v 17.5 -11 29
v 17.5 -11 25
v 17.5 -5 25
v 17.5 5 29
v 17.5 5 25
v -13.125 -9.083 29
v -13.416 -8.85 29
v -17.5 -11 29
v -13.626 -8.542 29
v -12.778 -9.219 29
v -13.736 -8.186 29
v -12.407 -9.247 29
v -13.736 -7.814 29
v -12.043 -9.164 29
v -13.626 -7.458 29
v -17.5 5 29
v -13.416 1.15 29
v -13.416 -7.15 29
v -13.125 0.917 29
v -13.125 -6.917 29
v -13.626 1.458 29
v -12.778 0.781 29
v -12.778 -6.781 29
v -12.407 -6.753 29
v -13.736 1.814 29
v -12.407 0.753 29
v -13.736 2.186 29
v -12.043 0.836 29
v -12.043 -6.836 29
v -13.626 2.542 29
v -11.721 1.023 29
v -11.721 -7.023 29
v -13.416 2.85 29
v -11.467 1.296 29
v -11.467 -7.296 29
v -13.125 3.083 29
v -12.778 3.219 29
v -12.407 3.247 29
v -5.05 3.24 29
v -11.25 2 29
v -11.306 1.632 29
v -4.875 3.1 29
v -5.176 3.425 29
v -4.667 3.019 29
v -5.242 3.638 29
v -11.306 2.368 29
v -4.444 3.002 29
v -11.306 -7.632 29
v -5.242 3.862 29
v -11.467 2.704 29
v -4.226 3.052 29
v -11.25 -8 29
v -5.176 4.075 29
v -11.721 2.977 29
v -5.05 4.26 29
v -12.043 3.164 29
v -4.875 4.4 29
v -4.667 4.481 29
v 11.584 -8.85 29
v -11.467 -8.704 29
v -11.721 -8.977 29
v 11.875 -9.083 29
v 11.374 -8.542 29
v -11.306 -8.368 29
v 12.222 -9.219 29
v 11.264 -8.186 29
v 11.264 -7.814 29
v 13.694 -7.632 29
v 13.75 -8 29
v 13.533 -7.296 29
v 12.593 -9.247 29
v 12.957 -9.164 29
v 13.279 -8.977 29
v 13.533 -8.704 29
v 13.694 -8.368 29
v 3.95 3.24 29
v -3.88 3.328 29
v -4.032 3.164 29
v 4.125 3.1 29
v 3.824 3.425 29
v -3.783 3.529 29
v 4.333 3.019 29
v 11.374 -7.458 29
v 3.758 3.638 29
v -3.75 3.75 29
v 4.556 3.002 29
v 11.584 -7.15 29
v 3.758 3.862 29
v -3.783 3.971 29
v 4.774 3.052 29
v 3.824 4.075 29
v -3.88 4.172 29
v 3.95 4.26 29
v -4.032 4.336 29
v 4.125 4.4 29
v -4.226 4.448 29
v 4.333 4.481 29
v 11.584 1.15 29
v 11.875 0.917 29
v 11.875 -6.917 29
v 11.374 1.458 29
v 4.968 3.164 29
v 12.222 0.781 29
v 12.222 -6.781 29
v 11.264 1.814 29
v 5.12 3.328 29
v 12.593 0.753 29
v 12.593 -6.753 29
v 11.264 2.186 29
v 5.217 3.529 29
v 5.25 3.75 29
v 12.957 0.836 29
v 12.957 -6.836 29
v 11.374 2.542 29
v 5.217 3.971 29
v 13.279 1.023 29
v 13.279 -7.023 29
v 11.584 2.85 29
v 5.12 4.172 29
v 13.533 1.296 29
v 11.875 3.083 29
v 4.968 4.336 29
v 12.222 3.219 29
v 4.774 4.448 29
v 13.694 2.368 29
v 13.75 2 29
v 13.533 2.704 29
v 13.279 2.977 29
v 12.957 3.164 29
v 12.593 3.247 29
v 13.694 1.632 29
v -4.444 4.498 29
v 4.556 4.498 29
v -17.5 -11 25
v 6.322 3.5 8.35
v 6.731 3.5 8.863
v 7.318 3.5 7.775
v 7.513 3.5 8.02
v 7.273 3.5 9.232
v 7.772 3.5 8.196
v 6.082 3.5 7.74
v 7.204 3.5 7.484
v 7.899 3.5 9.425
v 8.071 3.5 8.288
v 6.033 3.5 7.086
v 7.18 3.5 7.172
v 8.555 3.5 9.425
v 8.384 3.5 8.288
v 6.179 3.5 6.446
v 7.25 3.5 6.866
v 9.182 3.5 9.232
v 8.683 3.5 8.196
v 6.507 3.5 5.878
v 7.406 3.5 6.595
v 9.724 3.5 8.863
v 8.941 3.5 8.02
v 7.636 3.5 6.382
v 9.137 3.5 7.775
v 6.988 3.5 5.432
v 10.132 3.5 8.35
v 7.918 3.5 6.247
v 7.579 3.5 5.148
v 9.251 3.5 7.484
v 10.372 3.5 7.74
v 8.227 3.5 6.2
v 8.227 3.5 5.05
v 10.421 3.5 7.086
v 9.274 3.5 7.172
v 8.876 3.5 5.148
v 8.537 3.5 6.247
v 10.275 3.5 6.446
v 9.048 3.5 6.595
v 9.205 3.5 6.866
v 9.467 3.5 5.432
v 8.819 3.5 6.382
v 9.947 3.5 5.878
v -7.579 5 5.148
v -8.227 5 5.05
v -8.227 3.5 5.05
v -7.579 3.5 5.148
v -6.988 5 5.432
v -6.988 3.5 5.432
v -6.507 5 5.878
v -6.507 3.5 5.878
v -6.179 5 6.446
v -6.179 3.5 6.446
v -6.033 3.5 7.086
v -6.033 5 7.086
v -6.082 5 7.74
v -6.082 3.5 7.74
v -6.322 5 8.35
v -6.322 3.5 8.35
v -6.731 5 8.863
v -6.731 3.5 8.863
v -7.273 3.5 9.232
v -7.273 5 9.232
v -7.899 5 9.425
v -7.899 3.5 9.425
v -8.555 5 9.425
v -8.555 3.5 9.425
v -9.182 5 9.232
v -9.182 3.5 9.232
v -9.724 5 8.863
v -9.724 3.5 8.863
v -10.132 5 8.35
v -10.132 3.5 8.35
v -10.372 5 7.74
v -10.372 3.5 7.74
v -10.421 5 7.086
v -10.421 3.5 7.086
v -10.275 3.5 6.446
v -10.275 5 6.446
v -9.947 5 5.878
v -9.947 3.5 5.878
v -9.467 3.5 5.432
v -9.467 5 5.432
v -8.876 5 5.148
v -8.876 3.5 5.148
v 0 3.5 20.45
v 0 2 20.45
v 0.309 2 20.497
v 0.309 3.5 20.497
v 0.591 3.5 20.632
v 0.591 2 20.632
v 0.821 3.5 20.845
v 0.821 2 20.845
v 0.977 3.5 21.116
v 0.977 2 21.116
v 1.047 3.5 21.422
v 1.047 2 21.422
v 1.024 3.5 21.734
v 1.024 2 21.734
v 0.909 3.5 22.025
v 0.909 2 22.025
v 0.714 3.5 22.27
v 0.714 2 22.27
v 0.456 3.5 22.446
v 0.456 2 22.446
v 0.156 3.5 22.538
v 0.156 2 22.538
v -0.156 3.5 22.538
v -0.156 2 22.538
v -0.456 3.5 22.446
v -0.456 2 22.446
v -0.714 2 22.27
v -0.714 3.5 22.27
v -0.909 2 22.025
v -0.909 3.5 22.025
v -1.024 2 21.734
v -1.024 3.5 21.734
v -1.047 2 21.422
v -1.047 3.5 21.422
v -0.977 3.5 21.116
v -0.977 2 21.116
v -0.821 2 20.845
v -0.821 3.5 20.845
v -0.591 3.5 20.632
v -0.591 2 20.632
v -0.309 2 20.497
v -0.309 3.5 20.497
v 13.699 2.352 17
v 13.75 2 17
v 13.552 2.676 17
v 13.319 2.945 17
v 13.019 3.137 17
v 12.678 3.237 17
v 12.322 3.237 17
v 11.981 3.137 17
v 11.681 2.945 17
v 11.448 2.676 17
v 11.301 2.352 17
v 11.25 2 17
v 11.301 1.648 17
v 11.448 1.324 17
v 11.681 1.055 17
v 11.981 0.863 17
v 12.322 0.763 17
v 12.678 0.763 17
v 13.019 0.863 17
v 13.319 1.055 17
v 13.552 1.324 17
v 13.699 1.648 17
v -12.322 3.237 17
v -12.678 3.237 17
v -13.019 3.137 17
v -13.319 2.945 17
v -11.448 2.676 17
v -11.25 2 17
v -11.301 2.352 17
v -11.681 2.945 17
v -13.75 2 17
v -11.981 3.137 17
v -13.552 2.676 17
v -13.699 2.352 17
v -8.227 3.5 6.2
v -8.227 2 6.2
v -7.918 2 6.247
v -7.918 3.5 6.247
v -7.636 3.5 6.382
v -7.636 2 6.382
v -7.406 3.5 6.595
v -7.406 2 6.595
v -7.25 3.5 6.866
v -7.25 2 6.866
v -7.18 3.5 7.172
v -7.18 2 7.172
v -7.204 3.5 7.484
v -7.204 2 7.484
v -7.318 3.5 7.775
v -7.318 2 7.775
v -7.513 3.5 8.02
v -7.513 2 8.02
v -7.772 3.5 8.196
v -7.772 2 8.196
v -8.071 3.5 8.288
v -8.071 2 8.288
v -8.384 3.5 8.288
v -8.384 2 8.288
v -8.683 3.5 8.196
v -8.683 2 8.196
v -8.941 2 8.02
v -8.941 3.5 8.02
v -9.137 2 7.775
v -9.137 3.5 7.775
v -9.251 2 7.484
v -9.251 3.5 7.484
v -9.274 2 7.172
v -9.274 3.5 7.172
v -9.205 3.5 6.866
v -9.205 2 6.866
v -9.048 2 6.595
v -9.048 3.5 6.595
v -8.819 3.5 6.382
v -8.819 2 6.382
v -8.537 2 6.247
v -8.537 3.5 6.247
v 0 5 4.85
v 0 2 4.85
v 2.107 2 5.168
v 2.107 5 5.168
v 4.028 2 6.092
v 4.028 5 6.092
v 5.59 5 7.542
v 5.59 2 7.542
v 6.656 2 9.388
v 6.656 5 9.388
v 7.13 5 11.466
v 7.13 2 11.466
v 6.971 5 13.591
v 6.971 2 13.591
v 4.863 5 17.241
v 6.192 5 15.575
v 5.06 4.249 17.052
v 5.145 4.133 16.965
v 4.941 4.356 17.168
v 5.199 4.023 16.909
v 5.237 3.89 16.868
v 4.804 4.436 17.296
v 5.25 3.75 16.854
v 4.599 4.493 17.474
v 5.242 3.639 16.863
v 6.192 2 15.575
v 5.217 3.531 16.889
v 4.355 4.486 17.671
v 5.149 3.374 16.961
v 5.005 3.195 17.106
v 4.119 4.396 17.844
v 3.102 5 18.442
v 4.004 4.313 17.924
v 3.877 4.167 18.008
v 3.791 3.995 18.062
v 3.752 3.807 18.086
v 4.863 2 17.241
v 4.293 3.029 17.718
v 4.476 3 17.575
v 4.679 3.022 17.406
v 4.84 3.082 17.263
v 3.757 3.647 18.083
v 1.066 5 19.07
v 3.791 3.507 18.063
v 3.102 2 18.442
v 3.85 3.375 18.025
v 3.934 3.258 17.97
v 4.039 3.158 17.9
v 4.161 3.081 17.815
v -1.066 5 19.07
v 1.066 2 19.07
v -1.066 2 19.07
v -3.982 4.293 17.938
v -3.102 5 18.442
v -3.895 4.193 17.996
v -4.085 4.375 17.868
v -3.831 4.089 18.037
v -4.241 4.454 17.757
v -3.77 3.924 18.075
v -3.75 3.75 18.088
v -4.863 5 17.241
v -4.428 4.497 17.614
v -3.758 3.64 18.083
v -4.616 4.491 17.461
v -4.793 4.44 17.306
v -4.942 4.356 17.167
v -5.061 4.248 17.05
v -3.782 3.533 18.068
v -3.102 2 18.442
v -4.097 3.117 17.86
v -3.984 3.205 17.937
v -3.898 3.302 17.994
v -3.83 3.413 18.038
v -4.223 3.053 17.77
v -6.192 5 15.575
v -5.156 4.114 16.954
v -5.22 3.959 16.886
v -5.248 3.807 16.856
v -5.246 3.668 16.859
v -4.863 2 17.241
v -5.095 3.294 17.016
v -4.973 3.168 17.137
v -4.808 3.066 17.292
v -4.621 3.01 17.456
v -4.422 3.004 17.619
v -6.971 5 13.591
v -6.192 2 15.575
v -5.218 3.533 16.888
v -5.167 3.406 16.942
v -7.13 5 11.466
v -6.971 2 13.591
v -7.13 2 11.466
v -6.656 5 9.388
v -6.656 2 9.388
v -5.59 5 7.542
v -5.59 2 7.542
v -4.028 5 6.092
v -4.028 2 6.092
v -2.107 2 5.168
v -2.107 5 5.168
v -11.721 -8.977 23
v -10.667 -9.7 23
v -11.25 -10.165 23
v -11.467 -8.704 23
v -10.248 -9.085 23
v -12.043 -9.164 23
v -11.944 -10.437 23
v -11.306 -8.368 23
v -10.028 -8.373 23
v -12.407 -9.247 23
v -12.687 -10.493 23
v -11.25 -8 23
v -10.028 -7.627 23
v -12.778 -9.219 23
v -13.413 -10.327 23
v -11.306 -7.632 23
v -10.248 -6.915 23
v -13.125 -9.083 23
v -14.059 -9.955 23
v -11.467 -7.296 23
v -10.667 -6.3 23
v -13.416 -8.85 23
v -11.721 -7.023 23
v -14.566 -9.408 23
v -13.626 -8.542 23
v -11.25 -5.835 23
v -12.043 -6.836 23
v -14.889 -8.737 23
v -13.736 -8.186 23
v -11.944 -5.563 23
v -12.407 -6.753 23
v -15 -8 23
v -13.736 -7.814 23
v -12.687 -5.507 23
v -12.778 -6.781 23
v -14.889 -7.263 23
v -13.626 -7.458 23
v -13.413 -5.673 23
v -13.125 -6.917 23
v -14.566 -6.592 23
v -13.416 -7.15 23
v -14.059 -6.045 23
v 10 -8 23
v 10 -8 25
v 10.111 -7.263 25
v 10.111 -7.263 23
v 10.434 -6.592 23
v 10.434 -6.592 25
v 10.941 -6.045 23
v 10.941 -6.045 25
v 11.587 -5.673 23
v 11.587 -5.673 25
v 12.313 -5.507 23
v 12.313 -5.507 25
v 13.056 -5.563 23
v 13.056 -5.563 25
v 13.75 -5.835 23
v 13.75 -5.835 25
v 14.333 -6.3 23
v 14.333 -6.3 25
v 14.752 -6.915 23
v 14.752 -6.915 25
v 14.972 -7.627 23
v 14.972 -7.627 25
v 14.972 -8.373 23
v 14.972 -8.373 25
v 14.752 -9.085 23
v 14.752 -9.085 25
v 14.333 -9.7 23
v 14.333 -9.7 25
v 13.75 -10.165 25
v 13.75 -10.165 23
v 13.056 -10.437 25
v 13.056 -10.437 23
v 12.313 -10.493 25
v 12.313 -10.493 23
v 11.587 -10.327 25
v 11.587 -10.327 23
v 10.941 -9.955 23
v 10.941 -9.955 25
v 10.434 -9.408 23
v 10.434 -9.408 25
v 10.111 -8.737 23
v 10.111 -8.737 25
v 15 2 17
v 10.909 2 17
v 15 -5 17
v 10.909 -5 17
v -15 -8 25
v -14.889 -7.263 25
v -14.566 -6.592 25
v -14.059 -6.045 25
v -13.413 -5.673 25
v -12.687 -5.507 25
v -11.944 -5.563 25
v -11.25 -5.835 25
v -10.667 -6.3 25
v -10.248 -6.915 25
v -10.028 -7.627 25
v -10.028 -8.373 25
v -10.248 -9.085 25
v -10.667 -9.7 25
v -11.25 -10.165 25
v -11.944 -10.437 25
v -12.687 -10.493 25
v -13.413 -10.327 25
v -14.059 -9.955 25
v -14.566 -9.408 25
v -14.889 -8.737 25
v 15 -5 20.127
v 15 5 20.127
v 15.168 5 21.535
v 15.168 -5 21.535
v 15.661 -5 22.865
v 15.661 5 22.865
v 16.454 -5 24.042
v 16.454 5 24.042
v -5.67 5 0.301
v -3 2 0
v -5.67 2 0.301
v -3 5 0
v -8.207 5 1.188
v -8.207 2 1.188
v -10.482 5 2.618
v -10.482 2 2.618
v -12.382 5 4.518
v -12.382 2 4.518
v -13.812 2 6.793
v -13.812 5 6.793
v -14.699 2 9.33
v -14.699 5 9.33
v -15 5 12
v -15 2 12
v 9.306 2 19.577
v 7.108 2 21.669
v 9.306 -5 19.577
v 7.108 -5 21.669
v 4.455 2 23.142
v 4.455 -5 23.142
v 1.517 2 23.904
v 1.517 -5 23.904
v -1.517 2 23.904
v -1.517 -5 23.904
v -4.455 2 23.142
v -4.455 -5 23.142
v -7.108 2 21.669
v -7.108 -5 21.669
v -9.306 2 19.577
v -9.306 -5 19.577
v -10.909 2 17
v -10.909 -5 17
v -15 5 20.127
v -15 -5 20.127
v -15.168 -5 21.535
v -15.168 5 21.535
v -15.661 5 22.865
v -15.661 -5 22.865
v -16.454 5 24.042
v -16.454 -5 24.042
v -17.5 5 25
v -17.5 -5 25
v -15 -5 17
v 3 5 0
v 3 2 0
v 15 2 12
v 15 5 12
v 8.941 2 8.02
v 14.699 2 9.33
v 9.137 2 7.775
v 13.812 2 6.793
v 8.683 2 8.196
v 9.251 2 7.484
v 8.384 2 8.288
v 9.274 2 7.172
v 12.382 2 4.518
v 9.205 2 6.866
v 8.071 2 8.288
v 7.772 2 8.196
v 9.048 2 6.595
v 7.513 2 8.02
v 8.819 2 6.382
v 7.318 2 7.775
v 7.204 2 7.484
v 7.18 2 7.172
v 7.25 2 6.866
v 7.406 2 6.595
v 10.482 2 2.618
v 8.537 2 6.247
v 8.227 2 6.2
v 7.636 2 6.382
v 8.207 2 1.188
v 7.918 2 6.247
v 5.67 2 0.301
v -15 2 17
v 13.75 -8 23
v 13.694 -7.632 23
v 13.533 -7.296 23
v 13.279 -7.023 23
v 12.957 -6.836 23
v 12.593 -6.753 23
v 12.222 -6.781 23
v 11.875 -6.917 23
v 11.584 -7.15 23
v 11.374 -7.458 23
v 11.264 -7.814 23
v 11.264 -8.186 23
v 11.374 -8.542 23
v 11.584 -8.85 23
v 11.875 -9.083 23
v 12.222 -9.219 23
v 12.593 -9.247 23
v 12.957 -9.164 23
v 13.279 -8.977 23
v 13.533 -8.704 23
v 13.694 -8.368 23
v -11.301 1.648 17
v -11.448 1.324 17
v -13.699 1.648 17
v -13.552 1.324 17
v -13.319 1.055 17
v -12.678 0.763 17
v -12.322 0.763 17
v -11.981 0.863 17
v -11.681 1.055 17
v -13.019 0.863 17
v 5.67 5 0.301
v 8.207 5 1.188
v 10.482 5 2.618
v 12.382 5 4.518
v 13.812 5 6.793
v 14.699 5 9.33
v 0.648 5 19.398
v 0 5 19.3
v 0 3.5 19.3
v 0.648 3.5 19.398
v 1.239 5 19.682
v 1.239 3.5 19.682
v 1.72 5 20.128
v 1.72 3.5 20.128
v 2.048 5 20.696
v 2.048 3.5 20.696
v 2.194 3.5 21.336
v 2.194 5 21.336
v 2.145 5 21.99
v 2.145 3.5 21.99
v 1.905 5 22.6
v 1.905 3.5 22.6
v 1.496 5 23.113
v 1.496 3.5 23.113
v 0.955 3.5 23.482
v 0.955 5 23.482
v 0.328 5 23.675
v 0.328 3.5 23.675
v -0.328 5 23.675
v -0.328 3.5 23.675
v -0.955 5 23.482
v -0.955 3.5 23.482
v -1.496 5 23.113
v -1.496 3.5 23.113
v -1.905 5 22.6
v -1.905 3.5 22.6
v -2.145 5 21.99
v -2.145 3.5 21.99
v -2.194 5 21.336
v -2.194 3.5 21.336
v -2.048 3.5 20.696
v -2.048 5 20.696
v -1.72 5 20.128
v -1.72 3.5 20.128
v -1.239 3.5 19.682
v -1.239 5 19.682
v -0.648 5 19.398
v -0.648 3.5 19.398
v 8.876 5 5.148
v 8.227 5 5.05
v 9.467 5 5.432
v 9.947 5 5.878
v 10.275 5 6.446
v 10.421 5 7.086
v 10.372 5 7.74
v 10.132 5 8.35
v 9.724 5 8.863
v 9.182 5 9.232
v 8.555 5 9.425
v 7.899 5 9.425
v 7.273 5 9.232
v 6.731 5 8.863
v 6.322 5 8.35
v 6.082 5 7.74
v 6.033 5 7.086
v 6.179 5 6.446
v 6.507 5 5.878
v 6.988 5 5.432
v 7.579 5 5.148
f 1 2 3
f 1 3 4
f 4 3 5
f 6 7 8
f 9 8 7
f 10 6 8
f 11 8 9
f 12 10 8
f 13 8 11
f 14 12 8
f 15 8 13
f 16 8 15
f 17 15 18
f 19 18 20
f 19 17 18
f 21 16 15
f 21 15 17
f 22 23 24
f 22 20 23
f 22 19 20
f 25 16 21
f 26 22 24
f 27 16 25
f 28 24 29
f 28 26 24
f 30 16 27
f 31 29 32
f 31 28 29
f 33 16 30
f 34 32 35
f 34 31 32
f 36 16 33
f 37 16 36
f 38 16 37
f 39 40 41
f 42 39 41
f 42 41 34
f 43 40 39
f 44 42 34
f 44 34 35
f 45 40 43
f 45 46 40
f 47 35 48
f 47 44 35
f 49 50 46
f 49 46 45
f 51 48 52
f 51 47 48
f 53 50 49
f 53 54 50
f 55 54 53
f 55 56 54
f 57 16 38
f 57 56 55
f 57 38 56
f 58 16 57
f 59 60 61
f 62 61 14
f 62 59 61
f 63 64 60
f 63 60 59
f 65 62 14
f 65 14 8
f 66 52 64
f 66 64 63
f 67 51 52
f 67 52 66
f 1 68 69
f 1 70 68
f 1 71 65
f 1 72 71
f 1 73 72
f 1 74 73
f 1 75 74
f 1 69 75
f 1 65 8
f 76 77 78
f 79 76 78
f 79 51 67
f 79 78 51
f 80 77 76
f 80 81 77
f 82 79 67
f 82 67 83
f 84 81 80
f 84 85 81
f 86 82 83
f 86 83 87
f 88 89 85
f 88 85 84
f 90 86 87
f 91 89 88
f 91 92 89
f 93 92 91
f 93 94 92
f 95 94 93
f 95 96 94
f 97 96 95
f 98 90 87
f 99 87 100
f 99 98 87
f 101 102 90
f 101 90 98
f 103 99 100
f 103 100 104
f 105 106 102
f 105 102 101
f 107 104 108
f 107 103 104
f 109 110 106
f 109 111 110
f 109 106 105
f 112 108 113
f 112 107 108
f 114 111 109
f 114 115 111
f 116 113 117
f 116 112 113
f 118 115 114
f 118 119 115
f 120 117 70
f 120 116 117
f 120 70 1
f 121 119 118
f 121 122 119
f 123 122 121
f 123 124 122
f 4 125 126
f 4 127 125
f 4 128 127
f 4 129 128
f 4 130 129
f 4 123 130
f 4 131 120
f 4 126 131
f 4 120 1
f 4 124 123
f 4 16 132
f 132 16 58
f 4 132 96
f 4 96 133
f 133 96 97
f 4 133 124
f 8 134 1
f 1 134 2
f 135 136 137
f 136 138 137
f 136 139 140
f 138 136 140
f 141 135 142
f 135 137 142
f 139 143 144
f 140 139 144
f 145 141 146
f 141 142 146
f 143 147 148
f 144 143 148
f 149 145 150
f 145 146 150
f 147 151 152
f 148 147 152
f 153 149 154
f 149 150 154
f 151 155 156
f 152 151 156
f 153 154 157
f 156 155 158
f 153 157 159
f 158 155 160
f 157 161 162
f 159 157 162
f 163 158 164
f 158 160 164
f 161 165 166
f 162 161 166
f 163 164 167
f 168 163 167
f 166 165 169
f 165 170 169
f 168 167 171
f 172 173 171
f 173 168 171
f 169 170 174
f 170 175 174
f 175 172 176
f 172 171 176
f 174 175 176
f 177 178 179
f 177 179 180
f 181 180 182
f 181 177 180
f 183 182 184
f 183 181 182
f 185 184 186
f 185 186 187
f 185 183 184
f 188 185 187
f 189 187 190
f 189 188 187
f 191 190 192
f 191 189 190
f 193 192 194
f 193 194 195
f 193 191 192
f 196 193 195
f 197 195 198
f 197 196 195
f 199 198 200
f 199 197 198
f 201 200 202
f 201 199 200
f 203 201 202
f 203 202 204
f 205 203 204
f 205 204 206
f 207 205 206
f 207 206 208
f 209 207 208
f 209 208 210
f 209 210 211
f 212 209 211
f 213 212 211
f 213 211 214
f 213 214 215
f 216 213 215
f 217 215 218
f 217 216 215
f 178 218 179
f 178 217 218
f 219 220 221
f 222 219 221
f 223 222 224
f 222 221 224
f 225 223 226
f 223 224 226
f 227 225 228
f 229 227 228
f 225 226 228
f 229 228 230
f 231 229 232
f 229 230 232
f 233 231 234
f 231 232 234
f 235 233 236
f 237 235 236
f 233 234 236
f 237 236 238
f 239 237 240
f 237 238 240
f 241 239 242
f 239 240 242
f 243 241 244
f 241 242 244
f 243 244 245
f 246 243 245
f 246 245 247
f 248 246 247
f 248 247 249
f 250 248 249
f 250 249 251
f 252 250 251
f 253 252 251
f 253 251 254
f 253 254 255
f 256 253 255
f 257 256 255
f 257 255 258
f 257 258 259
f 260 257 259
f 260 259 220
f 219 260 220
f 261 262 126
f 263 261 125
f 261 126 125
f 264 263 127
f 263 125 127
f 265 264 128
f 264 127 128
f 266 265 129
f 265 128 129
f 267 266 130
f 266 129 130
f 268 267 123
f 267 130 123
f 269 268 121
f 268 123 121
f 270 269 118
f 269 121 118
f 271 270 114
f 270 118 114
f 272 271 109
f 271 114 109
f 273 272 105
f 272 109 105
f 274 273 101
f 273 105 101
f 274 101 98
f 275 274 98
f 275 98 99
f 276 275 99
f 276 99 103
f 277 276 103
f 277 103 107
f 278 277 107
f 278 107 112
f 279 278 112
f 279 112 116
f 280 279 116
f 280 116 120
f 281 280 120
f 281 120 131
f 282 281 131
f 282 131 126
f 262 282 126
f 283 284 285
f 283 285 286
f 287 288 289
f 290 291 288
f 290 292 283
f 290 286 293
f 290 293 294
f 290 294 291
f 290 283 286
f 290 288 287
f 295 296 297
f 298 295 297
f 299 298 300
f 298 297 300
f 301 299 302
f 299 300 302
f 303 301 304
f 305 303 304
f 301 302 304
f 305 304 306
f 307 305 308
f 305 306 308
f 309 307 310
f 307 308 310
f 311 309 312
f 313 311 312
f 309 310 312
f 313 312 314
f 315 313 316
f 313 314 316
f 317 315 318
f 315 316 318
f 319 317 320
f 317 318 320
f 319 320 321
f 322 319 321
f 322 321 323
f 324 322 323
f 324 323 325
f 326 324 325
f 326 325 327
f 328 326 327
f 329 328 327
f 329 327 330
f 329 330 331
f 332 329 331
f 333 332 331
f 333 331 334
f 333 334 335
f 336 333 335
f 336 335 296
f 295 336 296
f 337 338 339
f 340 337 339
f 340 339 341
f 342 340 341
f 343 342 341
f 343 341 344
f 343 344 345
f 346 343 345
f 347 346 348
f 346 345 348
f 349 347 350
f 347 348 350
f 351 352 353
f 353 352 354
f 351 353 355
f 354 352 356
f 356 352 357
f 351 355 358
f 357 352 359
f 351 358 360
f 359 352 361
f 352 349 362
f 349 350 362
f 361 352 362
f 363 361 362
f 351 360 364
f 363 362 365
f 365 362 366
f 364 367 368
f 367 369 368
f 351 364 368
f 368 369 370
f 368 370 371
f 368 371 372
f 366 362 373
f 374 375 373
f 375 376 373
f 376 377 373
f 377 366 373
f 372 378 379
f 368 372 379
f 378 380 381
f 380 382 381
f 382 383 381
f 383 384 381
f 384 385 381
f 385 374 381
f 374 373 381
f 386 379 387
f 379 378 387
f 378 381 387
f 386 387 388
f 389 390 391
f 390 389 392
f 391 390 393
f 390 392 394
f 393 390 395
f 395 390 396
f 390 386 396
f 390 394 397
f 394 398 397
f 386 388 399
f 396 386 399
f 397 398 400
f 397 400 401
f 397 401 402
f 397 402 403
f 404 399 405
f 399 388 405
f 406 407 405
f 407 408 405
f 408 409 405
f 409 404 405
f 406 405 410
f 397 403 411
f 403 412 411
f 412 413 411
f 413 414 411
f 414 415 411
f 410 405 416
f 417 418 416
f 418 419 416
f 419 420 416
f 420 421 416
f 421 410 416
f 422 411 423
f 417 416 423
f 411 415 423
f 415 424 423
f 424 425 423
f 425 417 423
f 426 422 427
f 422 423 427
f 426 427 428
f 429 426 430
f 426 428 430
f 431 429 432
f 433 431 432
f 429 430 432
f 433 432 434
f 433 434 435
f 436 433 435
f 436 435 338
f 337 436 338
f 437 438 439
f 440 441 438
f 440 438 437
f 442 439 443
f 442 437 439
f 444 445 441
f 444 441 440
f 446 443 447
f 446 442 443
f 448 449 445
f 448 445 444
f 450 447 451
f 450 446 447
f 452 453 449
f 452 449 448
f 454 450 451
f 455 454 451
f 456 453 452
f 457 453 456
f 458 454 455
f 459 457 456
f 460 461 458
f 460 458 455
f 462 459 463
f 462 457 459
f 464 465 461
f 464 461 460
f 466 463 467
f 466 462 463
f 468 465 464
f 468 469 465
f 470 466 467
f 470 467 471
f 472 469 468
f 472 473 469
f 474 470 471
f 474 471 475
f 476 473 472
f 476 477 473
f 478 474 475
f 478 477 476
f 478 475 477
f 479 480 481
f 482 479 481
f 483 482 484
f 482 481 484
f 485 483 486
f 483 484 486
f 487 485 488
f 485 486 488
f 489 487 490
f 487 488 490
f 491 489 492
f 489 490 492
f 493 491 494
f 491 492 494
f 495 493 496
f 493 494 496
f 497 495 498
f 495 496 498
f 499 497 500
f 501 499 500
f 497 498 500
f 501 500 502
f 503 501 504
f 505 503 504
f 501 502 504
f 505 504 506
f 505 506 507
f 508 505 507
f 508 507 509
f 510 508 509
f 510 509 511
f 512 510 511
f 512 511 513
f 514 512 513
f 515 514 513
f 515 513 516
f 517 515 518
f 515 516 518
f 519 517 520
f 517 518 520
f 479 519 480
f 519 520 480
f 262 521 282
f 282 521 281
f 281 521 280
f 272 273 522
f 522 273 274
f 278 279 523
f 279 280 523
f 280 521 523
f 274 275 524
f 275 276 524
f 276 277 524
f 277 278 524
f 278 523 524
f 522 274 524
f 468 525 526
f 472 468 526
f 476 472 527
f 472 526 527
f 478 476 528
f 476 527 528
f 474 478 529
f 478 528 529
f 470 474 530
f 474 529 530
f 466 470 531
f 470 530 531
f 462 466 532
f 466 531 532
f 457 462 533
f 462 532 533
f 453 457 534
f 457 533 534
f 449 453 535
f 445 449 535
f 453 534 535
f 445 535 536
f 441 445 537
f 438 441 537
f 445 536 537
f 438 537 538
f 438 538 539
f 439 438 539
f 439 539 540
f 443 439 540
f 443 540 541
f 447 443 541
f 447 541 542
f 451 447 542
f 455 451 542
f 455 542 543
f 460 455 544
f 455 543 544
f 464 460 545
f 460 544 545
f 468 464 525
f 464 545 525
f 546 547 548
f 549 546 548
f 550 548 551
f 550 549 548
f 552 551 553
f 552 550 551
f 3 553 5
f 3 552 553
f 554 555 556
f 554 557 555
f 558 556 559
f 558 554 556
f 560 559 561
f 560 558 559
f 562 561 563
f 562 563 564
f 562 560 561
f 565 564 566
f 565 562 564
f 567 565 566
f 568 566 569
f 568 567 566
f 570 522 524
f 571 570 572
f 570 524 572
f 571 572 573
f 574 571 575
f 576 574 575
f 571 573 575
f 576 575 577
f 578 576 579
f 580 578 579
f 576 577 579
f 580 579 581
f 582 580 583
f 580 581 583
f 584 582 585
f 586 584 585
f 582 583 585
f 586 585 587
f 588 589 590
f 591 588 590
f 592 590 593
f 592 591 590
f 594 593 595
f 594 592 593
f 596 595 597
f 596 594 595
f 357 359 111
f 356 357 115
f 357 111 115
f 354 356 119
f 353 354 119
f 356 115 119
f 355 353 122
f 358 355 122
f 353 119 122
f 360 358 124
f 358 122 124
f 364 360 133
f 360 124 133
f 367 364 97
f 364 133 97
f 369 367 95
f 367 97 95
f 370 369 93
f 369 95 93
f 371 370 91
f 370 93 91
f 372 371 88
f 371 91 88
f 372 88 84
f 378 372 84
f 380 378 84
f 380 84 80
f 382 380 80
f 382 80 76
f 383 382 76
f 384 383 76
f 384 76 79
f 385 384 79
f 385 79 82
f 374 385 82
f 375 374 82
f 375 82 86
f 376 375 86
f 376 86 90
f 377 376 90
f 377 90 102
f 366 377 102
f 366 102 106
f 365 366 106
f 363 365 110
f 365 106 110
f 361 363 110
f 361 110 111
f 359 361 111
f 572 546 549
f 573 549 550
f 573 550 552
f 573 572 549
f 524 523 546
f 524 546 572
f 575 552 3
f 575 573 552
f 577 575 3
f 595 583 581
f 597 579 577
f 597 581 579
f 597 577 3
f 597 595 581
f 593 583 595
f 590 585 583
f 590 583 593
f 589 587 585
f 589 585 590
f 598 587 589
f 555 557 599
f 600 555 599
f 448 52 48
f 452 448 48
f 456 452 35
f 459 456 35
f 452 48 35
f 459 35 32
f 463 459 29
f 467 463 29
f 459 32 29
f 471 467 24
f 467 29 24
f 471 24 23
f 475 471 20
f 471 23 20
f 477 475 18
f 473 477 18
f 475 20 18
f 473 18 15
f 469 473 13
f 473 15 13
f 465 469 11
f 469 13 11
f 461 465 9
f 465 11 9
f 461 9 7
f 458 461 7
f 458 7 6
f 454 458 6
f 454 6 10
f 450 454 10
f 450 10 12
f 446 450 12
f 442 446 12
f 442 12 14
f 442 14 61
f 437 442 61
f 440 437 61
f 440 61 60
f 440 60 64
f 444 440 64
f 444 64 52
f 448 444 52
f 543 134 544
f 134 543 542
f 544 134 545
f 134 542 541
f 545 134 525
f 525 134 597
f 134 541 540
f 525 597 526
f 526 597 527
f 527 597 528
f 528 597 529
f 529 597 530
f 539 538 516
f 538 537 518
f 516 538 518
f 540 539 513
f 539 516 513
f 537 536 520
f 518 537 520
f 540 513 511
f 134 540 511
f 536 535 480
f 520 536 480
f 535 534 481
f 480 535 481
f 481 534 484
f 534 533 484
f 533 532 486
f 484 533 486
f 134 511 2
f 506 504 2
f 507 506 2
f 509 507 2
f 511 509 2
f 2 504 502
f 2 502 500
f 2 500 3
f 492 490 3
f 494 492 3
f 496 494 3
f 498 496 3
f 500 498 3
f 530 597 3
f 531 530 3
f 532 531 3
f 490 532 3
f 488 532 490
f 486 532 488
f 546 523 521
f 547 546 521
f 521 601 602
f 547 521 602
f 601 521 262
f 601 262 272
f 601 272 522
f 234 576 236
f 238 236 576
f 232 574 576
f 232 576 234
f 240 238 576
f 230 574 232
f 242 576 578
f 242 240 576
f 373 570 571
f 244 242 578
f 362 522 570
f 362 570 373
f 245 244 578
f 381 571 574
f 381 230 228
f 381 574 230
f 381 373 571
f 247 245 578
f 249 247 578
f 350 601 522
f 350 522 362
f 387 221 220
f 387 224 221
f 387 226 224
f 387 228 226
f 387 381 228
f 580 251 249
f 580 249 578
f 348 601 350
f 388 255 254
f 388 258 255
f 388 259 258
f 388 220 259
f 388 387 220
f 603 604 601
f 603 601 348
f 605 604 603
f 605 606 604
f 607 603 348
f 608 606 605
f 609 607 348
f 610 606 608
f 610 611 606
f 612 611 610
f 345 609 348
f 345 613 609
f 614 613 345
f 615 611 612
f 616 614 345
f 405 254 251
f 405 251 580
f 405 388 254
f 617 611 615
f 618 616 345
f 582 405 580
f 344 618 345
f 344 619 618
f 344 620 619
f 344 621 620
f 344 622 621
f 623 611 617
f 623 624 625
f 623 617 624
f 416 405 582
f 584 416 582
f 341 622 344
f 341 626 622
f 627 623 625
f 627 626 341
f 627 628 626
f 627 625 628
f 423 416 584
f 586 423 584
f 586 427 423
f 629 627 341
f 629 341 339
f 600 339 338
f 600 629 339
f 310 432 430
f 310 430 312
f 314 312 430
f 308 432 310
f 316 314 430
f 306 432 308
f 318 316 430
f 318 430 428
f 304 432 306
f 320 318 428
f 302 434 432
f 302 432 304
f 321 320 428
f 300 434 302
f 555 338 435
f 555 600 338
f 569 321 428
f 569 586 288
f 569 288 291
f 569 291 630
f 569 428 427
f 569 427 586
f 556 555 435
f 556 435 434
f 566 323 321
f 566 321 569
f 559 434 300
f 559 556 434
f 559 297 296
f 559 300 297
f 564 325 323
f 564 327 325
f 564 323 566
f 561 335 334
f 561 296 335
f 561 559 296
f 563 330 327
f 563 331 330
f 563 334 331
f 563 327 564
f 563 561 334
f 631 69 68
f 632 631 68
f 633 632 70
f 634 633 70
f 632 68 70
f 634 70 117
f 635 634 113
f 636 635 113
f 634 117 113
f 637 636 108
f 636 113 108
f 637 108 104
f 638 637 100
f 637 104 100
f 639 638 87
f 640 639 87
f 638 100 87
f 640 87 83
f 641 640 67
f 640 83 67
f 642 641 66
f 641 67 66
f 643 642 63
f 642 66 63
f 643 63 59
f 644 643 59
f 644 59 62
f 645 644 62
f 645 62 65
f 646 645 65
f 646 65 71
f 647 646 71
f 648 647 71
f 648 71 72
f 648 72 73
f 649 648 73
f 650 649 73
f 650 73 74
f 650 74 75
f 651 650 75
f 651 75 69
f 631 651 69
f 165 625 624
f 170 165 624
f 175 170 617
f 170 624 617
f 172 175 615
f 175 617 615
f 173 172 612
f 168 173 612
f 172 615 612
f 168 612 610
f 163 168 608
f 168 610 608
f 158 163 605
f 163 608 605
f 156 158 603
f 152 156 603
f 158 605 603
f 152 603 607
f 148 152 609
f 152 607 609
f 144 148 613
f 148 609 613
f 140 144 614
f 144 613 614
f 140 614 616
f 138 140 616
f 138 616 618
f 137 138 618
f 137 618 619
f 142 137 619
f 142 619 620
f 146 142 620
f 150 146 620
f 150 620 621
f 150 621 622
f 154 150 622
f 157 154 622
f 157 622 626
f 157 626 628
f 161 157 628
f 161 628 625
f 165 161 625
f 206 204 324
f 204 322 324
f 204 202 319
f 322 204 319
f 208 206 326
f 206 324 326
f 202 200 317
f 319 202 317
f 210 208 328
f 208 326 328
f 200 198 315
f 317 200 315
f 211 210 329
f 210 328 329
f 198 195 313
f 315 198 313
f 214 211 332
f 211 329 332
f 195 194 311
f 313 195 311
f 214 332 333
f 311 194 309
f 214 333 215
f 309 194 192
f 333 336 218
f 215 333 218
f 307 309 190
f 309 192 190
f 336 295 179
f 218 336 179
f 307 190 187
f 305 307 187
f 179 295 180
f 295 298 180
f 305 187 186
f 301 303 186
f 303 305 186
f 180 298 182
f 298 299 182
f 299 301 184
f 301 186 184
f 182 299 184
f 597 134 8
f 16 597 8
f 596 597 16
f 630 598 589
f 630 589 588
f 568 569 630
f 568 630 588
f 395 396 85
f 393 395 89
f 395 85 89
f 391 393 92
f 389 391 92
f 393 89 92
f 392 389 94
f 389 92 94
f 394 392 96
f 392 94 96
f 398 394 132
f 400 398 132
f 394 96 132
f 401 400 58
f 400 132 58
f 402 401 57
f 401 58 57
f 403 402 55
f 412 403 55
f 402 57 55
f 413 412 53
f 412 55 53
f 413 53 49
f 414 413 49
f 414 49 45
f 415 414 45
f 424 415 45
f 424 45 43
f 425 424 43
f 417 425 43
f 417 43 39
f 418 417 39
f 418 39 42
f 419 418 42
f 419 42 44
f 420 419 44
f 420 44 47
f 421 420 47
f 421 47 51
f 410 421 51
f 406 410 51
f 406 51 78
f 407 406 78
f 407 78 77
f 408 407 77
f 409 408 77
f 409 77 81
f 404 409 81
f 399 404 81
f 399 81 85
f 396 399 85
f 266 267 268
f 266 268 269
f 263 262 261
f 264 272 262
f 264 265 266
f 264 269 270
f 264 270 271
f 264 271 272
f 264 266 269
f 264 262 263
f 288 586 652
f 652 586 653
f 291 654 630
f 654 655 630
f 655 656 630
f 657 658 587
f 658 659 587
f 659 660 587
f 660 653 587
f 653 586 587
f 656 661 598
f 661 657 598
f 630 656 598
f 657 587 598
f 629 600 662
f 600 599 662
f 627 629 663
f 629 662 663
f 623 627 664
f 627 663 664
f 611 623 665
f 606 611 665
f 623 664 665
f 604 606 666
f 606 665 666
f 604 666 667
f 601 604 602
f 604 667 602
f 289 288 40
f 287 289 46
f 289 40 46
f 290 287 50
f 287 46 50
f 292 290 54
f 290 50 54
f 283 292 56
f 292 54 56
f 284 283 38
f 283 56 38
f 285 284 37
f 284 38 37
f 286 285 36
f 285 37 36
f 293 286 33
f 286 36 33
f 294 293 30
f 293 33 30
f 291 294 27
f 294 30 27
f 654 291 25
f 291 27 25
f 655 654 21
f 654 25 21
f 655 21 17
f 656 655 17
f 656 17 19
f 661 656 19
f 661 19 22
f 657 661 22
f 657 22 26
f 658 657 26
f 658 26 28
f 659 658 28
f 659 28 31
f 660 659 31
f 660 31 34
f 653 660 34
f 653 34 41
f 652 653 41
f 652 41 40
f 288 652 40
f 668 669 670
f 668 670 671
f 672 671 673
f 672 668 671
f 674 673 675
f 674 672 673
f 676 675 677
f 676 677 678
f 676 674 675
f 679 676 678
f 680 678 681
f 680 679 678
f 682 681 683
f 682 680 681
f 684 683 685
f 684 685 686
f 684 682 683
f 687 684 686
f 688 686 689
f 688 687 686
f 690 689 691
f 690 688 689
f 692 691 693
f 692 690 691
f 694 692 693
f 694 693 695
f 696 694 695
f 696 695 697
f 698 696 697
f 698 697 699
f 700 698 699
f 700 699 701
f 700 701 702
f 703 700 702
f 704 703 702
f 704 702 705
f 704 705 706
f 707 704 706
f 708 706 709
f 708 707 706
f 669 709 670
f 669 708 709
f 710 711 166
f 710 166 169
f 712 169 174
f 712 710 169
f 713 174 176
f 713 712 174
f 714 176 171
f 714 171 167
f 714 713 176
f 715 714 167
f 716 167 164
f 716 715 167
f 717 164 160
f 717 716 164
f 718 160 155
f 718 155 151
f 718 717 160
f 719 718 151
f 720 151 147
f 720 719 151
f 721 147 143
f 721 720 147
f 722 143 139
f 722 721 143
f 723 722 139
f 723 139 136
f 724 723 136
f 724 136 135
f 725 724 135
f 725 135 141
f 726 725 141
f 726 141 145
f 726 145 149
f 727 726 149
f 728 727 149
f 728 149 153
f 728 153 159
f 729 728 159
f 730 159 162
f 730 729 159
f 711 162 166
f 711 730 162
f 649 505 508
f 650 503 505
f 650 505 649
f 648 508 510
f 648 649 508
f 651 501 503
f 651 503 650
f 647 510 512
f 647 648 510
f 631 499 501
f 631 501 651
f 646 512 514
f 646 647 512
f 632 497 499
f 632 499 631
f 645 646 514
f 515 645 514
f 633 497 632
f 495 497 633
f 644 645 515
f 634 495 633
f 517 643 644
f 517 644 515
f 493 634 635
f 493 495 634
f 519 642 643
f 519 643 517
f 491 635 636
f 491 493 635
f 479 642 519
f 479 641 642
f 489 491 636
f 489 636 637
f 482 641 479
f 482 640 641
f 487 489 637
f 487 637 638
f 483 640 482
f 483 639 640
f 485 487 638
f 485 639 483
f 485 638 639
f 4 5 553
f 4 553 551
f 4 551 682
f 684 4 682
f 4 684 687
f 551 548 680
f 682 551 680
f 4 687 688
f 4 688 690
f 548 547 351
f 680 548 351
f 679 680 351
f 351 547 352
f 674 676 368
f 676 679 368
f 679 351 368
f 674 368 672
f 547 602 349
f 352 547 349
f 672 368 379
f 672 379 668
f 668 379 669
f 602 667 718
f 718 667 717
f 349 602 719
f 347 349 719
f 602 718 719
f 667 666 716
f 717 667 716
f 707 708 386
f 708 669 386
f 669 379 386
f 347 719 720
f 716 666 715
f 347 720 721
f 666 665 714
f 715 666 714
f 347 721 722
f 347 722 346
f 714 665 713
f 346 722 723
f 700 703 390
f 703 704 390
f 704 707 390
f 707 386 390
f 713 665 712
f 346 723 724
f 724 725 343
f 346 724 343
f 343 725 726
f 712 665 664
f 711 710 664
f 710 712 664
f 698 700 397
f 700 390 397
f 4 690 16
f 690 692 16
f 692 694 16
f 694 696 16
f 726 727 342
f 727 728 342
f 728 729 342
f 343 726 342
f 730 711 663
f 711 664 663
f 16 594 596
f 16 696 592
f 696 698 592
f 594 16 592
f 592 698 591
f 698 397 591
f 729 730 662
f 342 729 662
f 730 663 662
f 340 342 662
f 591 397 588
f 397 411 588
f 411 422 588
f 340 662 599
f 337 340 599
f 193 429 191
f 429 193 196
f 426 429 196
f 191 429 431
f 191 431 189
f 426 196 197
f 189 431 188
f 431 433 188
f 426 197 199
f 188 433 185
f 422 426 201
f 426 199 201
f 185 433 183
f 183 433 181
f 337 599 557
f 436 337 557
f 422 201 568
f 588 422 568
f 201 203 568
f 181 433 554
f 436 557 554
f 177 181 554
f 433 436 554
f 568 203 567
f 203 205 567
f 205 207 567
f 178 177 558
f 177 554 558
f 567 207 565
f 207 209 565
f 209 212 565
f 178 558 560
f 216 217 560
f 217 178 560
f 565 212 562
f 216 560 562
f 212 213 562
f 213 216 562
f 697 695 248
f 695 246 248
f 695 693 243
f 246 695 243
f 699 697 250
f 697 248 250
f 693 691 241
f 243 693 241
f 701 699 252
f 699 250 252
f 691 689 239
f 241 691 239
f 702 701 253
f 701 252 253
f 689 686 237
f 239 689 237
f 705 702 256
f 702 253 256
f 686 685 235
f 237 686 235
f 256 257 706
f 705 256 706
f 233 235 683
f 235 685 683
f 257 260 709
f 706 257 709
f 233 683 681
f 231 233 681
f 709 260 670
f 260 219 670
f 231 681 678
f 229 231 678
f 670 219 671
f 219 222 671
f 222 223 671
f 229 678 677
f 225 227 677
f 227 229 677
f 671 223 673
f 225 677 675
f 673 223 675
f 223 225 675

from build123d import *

# Parameters (mm, degrees)
SKETCH1_W                           = 30
SKETCH1_H                           = 10
MAIN_DEPTH                          = 25
SKETCH5_R                           = 1.05
SKETCH5_R_2                         = 7.15
MAINANDFIXHOLE_DEPTH                = 31.822070015
SKETCH6_R                           = 2.2
CODERFIXHOLE2_DEPTH                 = 1.5
CODERHOLE2_DEPTH                    = 7
SKETCH10_W                          = 35
SKETCH10_H                          = 16
LINK_DEPTH                          = 4
SKETCH8_R                           = 1.25
VERTICALHOLES_DEPTH                 = 12
SKETCH13_R                          = 2.5
LINKREINFORCEMENT_DEPTH             = 2
FILLET4_R                           = 6
FILLET6_R                           = 12
HOLELPATTERN1_COUNT                 = 2
HOLELPATTERN1_PITCH                 = 25
HOLELPATTERN1_COUNT_DIR2            = 2
HOLELPATTERN1_PITCH_DIR2            = 10
HOLETOACCESSENCODERSCREW_REACH      = 37.612
HOLETOACCESSENCODERSCREW_END_RADIUS = 7.15
SKETCH14_R                          = 0.75


with BuildPart() as part:
    # Sketch1 → Main (new body)
    with BuildSketch(Plane.XY):
        Rectangle(SKETCH1_W, SKETCH1_H)
    extrude(amount=MAIN_DEPTH)

    # Sketch5 → MainAndFixHole (cut, through all)
    with BuildSketch(Plane(origin=(0, -5, 0), x_dir=(-1, 0, 0), z_dir=(0, -1, 0))):
        with Locations(Location((0, -21.5, 0), (0, 0, 90))):
            Circle(SKETCH5_R)
        with Locations(Location((-8.227241336, -7.25, 0), (0, 0, 90))):
            Circle(SKETCH5_R)
        with Locations(Location((8.227241336, -7.25, 0), (0, 0, 90))):
            Circle(SKETCH5_R)
        with Locations(Location((0, -12, 0), (0, 0, 90))):
            Circle(SKETCH5_R_2)
    extrude(amount=-MAINANDFIXHOLE_DEPTH, mode=Mode.SUBTRACT)

    # Sketch6 → CoderFixHole2 (cut)
    with BuildSketch(Plane(origin=(0, 5, 0), x_dir=(-1, 0, 0), z_dir=(0, -1, 0))):
        with Locations(Location((0, -21.5, 0), (0, 0, 90))):
            Circle(SKETCH6_R)
        with Locations(Location((-8.227241336, -7.25, 0), (0, 0, 90))):
            Circle(SKETCH6_R)
        with Locations(Location((8.227241336, -7.25, 0), (0, 0, 90))):
            Circle(SKETCH6_R)
    extrude(amount=CODERFIXHOLE2_DEPTH, mode=Mode.SUBTRACT)

    # Sketch11 → CoderHole2 (cut)
    with BuildSketch(Plane(origin=(0, -5, 0), x_dir=(1, 0, 0), z_dir=(0, 1, 0))):
        with BuildLine():
            Line((-15, 0), (15, 0))
            Line((15, 0), (15, -17))
            Line((15, -17), (10.908712115, -17))
            ThreePointArc((10.908712115, -17), (0, -24), (-10.908712115, -17))
            Line((-10.908712115, -17), (-15, -17))
            Line((-15, -17), (-15, 0))
        make_face()
    extrude(amount=CODERHOLE2_DEPTH, mode=Mode.SUBTRACT)

    # Sketch10 → Link (add)
    with BuildSketch(Plane.XY.offset(25)):
        with Locations((0, -3)):
            Rectangle(SKETCH10_W, SKETCH10_H)
    extrude(amount=LINK_DEPTH)

    # Sketch8 → VerticalHoles (cut)
    with BuildSketch(Plane.XY.offset(29)):
        with Locations((12.5, 2)):
            Circle(SKETCH8_R)
    verticalholes = extrude(amount=-VERTICALHOLES_DEPTH, mode=Mode.SUBTRACT)

    # Sketch13 → LinkReinforcement (add)
    with BuildSketch(Plane(origin=(0, 0, 25), x_dir=(-1, 0, 0), z_dir=(0, 0, -1))):
        with Locations((-12.5, -8)):
            Circle(SKETCH13_R)
        with Locations((12.5, -8)):
            Circle(SKETCH13_R)
    extrude(amount=LINKREINFORCEMENT_DEPTH)

    # Fillet4
    # the kernel refuses this fillet: 6 mm, written as the material it adds along each edge
    with BuildSketch(Plane(origin=(15, -5, 25), x_dir=(1, 0, 0), z_dir=(0, 1, 0)), Plane(origin=(-15, 5, 25), x_dir=(-1, 0, 0), z_dir=(0, -1, 0))) as fillet4_piece_1:
        with BuildLine():
            CenterArc((6, 4.873397172), FILLET4_R, 180, 54.314665287)
            Line((0, 4.873397172), (-0.12, 4.873397172))
            Line((-0.12, 4.873397172), (-0.12, 0))
            Line((-0.12, 0), (0, -0.12))
            ThreePointArc((0, -0.12), (1.25, -0.12), (2.43, -0.097467943))
            Line((2.43, -0.097467943), (2.5, 0))
        make_face()
    extrude(amount=10)

    # Fillet6
    fillet6_edges = [part.edges().sort_by_distance(p)[0] for p in [
        (-15, 3.5, 0),
        (15, 3.5, 0),
    ]]
    fillet(fillet6_edges, radius=FILLET6_R)

    # HoleLPattern1: VerticalHoles 2 × 2
    with Locations(*[(-i * HOLELPATTERN1_PITCH, -j * HOLELPATTERN1_PITCH_DIR2, 0) for i in range(HOLELPATTERN1_COUNT) for j in range(HOLELPATTERN1_COUNT_DIR2) if (i, j) != (0, 0)]):
        add(verticalholes, mode=Mode.SUBTRACT)

    # HoleToAccessEncoderScrew: up to this cylinder (the profile starts outside it)
    holetoaccessencoderscrew_end = Plane(origin=(0, 3.75, 12), z_dir=(0, -1, 0)) * Cylinder(HOLETOACCESSENCODERSCREW_END_RADIUS, 90.524, mode=Mode.PRIVATE)
    # Sketch14 → HoleToAccessEncoderScrew (cut, up to the surface)
    with BuildSketch(Plane.XY.offset(29), mode=Mode.PRIVATE) as holetoaccessencoderscrew_sk1:
        with Locations((4.5, 3.75)):
            Circle(SKETCH14_R)
    holetoaccessencoderscrew_tool1 = extrude(holetoaccessencoderscrew_sk1.sketch, amount=-HOLETOACCESSENCODERSCREW_REACH, mode=Mode.PRIVATE) - holetoaccessencoderscrew_end
    add(holetoaccessencoderscrew_tool1.solids().sort_by_distance((4.5, 3.75, 29))[0], mode=Mode.SUBTRACT)
    # Sketch14 → HoleToAccessEncoderScrew (cut, up to the surface)
    with BuildSketch(Plane.XY.offset(29), mode=Mode.PRIVATE) as holetoaccessencoderscrew_sk2:
        with Locations((-4.5, 3.75)):
            Circle(SKETCH14_R)
    holetoaccessencoderscrew_tool2 = extrude(holetoaccessencoderscrew_sk2.sketch, amount=-HOLETOACCESSENCODERSCREW_REACH, mode=Mode.PRIVATE) - holetoaccessencoderscrew_end
    add(holetoaccessencoderscrew_tool2.solids().sort_by_distance((-4.5, 3.75, 29))[0], mode=Mode.SUBTRACT)


solid = part.part
